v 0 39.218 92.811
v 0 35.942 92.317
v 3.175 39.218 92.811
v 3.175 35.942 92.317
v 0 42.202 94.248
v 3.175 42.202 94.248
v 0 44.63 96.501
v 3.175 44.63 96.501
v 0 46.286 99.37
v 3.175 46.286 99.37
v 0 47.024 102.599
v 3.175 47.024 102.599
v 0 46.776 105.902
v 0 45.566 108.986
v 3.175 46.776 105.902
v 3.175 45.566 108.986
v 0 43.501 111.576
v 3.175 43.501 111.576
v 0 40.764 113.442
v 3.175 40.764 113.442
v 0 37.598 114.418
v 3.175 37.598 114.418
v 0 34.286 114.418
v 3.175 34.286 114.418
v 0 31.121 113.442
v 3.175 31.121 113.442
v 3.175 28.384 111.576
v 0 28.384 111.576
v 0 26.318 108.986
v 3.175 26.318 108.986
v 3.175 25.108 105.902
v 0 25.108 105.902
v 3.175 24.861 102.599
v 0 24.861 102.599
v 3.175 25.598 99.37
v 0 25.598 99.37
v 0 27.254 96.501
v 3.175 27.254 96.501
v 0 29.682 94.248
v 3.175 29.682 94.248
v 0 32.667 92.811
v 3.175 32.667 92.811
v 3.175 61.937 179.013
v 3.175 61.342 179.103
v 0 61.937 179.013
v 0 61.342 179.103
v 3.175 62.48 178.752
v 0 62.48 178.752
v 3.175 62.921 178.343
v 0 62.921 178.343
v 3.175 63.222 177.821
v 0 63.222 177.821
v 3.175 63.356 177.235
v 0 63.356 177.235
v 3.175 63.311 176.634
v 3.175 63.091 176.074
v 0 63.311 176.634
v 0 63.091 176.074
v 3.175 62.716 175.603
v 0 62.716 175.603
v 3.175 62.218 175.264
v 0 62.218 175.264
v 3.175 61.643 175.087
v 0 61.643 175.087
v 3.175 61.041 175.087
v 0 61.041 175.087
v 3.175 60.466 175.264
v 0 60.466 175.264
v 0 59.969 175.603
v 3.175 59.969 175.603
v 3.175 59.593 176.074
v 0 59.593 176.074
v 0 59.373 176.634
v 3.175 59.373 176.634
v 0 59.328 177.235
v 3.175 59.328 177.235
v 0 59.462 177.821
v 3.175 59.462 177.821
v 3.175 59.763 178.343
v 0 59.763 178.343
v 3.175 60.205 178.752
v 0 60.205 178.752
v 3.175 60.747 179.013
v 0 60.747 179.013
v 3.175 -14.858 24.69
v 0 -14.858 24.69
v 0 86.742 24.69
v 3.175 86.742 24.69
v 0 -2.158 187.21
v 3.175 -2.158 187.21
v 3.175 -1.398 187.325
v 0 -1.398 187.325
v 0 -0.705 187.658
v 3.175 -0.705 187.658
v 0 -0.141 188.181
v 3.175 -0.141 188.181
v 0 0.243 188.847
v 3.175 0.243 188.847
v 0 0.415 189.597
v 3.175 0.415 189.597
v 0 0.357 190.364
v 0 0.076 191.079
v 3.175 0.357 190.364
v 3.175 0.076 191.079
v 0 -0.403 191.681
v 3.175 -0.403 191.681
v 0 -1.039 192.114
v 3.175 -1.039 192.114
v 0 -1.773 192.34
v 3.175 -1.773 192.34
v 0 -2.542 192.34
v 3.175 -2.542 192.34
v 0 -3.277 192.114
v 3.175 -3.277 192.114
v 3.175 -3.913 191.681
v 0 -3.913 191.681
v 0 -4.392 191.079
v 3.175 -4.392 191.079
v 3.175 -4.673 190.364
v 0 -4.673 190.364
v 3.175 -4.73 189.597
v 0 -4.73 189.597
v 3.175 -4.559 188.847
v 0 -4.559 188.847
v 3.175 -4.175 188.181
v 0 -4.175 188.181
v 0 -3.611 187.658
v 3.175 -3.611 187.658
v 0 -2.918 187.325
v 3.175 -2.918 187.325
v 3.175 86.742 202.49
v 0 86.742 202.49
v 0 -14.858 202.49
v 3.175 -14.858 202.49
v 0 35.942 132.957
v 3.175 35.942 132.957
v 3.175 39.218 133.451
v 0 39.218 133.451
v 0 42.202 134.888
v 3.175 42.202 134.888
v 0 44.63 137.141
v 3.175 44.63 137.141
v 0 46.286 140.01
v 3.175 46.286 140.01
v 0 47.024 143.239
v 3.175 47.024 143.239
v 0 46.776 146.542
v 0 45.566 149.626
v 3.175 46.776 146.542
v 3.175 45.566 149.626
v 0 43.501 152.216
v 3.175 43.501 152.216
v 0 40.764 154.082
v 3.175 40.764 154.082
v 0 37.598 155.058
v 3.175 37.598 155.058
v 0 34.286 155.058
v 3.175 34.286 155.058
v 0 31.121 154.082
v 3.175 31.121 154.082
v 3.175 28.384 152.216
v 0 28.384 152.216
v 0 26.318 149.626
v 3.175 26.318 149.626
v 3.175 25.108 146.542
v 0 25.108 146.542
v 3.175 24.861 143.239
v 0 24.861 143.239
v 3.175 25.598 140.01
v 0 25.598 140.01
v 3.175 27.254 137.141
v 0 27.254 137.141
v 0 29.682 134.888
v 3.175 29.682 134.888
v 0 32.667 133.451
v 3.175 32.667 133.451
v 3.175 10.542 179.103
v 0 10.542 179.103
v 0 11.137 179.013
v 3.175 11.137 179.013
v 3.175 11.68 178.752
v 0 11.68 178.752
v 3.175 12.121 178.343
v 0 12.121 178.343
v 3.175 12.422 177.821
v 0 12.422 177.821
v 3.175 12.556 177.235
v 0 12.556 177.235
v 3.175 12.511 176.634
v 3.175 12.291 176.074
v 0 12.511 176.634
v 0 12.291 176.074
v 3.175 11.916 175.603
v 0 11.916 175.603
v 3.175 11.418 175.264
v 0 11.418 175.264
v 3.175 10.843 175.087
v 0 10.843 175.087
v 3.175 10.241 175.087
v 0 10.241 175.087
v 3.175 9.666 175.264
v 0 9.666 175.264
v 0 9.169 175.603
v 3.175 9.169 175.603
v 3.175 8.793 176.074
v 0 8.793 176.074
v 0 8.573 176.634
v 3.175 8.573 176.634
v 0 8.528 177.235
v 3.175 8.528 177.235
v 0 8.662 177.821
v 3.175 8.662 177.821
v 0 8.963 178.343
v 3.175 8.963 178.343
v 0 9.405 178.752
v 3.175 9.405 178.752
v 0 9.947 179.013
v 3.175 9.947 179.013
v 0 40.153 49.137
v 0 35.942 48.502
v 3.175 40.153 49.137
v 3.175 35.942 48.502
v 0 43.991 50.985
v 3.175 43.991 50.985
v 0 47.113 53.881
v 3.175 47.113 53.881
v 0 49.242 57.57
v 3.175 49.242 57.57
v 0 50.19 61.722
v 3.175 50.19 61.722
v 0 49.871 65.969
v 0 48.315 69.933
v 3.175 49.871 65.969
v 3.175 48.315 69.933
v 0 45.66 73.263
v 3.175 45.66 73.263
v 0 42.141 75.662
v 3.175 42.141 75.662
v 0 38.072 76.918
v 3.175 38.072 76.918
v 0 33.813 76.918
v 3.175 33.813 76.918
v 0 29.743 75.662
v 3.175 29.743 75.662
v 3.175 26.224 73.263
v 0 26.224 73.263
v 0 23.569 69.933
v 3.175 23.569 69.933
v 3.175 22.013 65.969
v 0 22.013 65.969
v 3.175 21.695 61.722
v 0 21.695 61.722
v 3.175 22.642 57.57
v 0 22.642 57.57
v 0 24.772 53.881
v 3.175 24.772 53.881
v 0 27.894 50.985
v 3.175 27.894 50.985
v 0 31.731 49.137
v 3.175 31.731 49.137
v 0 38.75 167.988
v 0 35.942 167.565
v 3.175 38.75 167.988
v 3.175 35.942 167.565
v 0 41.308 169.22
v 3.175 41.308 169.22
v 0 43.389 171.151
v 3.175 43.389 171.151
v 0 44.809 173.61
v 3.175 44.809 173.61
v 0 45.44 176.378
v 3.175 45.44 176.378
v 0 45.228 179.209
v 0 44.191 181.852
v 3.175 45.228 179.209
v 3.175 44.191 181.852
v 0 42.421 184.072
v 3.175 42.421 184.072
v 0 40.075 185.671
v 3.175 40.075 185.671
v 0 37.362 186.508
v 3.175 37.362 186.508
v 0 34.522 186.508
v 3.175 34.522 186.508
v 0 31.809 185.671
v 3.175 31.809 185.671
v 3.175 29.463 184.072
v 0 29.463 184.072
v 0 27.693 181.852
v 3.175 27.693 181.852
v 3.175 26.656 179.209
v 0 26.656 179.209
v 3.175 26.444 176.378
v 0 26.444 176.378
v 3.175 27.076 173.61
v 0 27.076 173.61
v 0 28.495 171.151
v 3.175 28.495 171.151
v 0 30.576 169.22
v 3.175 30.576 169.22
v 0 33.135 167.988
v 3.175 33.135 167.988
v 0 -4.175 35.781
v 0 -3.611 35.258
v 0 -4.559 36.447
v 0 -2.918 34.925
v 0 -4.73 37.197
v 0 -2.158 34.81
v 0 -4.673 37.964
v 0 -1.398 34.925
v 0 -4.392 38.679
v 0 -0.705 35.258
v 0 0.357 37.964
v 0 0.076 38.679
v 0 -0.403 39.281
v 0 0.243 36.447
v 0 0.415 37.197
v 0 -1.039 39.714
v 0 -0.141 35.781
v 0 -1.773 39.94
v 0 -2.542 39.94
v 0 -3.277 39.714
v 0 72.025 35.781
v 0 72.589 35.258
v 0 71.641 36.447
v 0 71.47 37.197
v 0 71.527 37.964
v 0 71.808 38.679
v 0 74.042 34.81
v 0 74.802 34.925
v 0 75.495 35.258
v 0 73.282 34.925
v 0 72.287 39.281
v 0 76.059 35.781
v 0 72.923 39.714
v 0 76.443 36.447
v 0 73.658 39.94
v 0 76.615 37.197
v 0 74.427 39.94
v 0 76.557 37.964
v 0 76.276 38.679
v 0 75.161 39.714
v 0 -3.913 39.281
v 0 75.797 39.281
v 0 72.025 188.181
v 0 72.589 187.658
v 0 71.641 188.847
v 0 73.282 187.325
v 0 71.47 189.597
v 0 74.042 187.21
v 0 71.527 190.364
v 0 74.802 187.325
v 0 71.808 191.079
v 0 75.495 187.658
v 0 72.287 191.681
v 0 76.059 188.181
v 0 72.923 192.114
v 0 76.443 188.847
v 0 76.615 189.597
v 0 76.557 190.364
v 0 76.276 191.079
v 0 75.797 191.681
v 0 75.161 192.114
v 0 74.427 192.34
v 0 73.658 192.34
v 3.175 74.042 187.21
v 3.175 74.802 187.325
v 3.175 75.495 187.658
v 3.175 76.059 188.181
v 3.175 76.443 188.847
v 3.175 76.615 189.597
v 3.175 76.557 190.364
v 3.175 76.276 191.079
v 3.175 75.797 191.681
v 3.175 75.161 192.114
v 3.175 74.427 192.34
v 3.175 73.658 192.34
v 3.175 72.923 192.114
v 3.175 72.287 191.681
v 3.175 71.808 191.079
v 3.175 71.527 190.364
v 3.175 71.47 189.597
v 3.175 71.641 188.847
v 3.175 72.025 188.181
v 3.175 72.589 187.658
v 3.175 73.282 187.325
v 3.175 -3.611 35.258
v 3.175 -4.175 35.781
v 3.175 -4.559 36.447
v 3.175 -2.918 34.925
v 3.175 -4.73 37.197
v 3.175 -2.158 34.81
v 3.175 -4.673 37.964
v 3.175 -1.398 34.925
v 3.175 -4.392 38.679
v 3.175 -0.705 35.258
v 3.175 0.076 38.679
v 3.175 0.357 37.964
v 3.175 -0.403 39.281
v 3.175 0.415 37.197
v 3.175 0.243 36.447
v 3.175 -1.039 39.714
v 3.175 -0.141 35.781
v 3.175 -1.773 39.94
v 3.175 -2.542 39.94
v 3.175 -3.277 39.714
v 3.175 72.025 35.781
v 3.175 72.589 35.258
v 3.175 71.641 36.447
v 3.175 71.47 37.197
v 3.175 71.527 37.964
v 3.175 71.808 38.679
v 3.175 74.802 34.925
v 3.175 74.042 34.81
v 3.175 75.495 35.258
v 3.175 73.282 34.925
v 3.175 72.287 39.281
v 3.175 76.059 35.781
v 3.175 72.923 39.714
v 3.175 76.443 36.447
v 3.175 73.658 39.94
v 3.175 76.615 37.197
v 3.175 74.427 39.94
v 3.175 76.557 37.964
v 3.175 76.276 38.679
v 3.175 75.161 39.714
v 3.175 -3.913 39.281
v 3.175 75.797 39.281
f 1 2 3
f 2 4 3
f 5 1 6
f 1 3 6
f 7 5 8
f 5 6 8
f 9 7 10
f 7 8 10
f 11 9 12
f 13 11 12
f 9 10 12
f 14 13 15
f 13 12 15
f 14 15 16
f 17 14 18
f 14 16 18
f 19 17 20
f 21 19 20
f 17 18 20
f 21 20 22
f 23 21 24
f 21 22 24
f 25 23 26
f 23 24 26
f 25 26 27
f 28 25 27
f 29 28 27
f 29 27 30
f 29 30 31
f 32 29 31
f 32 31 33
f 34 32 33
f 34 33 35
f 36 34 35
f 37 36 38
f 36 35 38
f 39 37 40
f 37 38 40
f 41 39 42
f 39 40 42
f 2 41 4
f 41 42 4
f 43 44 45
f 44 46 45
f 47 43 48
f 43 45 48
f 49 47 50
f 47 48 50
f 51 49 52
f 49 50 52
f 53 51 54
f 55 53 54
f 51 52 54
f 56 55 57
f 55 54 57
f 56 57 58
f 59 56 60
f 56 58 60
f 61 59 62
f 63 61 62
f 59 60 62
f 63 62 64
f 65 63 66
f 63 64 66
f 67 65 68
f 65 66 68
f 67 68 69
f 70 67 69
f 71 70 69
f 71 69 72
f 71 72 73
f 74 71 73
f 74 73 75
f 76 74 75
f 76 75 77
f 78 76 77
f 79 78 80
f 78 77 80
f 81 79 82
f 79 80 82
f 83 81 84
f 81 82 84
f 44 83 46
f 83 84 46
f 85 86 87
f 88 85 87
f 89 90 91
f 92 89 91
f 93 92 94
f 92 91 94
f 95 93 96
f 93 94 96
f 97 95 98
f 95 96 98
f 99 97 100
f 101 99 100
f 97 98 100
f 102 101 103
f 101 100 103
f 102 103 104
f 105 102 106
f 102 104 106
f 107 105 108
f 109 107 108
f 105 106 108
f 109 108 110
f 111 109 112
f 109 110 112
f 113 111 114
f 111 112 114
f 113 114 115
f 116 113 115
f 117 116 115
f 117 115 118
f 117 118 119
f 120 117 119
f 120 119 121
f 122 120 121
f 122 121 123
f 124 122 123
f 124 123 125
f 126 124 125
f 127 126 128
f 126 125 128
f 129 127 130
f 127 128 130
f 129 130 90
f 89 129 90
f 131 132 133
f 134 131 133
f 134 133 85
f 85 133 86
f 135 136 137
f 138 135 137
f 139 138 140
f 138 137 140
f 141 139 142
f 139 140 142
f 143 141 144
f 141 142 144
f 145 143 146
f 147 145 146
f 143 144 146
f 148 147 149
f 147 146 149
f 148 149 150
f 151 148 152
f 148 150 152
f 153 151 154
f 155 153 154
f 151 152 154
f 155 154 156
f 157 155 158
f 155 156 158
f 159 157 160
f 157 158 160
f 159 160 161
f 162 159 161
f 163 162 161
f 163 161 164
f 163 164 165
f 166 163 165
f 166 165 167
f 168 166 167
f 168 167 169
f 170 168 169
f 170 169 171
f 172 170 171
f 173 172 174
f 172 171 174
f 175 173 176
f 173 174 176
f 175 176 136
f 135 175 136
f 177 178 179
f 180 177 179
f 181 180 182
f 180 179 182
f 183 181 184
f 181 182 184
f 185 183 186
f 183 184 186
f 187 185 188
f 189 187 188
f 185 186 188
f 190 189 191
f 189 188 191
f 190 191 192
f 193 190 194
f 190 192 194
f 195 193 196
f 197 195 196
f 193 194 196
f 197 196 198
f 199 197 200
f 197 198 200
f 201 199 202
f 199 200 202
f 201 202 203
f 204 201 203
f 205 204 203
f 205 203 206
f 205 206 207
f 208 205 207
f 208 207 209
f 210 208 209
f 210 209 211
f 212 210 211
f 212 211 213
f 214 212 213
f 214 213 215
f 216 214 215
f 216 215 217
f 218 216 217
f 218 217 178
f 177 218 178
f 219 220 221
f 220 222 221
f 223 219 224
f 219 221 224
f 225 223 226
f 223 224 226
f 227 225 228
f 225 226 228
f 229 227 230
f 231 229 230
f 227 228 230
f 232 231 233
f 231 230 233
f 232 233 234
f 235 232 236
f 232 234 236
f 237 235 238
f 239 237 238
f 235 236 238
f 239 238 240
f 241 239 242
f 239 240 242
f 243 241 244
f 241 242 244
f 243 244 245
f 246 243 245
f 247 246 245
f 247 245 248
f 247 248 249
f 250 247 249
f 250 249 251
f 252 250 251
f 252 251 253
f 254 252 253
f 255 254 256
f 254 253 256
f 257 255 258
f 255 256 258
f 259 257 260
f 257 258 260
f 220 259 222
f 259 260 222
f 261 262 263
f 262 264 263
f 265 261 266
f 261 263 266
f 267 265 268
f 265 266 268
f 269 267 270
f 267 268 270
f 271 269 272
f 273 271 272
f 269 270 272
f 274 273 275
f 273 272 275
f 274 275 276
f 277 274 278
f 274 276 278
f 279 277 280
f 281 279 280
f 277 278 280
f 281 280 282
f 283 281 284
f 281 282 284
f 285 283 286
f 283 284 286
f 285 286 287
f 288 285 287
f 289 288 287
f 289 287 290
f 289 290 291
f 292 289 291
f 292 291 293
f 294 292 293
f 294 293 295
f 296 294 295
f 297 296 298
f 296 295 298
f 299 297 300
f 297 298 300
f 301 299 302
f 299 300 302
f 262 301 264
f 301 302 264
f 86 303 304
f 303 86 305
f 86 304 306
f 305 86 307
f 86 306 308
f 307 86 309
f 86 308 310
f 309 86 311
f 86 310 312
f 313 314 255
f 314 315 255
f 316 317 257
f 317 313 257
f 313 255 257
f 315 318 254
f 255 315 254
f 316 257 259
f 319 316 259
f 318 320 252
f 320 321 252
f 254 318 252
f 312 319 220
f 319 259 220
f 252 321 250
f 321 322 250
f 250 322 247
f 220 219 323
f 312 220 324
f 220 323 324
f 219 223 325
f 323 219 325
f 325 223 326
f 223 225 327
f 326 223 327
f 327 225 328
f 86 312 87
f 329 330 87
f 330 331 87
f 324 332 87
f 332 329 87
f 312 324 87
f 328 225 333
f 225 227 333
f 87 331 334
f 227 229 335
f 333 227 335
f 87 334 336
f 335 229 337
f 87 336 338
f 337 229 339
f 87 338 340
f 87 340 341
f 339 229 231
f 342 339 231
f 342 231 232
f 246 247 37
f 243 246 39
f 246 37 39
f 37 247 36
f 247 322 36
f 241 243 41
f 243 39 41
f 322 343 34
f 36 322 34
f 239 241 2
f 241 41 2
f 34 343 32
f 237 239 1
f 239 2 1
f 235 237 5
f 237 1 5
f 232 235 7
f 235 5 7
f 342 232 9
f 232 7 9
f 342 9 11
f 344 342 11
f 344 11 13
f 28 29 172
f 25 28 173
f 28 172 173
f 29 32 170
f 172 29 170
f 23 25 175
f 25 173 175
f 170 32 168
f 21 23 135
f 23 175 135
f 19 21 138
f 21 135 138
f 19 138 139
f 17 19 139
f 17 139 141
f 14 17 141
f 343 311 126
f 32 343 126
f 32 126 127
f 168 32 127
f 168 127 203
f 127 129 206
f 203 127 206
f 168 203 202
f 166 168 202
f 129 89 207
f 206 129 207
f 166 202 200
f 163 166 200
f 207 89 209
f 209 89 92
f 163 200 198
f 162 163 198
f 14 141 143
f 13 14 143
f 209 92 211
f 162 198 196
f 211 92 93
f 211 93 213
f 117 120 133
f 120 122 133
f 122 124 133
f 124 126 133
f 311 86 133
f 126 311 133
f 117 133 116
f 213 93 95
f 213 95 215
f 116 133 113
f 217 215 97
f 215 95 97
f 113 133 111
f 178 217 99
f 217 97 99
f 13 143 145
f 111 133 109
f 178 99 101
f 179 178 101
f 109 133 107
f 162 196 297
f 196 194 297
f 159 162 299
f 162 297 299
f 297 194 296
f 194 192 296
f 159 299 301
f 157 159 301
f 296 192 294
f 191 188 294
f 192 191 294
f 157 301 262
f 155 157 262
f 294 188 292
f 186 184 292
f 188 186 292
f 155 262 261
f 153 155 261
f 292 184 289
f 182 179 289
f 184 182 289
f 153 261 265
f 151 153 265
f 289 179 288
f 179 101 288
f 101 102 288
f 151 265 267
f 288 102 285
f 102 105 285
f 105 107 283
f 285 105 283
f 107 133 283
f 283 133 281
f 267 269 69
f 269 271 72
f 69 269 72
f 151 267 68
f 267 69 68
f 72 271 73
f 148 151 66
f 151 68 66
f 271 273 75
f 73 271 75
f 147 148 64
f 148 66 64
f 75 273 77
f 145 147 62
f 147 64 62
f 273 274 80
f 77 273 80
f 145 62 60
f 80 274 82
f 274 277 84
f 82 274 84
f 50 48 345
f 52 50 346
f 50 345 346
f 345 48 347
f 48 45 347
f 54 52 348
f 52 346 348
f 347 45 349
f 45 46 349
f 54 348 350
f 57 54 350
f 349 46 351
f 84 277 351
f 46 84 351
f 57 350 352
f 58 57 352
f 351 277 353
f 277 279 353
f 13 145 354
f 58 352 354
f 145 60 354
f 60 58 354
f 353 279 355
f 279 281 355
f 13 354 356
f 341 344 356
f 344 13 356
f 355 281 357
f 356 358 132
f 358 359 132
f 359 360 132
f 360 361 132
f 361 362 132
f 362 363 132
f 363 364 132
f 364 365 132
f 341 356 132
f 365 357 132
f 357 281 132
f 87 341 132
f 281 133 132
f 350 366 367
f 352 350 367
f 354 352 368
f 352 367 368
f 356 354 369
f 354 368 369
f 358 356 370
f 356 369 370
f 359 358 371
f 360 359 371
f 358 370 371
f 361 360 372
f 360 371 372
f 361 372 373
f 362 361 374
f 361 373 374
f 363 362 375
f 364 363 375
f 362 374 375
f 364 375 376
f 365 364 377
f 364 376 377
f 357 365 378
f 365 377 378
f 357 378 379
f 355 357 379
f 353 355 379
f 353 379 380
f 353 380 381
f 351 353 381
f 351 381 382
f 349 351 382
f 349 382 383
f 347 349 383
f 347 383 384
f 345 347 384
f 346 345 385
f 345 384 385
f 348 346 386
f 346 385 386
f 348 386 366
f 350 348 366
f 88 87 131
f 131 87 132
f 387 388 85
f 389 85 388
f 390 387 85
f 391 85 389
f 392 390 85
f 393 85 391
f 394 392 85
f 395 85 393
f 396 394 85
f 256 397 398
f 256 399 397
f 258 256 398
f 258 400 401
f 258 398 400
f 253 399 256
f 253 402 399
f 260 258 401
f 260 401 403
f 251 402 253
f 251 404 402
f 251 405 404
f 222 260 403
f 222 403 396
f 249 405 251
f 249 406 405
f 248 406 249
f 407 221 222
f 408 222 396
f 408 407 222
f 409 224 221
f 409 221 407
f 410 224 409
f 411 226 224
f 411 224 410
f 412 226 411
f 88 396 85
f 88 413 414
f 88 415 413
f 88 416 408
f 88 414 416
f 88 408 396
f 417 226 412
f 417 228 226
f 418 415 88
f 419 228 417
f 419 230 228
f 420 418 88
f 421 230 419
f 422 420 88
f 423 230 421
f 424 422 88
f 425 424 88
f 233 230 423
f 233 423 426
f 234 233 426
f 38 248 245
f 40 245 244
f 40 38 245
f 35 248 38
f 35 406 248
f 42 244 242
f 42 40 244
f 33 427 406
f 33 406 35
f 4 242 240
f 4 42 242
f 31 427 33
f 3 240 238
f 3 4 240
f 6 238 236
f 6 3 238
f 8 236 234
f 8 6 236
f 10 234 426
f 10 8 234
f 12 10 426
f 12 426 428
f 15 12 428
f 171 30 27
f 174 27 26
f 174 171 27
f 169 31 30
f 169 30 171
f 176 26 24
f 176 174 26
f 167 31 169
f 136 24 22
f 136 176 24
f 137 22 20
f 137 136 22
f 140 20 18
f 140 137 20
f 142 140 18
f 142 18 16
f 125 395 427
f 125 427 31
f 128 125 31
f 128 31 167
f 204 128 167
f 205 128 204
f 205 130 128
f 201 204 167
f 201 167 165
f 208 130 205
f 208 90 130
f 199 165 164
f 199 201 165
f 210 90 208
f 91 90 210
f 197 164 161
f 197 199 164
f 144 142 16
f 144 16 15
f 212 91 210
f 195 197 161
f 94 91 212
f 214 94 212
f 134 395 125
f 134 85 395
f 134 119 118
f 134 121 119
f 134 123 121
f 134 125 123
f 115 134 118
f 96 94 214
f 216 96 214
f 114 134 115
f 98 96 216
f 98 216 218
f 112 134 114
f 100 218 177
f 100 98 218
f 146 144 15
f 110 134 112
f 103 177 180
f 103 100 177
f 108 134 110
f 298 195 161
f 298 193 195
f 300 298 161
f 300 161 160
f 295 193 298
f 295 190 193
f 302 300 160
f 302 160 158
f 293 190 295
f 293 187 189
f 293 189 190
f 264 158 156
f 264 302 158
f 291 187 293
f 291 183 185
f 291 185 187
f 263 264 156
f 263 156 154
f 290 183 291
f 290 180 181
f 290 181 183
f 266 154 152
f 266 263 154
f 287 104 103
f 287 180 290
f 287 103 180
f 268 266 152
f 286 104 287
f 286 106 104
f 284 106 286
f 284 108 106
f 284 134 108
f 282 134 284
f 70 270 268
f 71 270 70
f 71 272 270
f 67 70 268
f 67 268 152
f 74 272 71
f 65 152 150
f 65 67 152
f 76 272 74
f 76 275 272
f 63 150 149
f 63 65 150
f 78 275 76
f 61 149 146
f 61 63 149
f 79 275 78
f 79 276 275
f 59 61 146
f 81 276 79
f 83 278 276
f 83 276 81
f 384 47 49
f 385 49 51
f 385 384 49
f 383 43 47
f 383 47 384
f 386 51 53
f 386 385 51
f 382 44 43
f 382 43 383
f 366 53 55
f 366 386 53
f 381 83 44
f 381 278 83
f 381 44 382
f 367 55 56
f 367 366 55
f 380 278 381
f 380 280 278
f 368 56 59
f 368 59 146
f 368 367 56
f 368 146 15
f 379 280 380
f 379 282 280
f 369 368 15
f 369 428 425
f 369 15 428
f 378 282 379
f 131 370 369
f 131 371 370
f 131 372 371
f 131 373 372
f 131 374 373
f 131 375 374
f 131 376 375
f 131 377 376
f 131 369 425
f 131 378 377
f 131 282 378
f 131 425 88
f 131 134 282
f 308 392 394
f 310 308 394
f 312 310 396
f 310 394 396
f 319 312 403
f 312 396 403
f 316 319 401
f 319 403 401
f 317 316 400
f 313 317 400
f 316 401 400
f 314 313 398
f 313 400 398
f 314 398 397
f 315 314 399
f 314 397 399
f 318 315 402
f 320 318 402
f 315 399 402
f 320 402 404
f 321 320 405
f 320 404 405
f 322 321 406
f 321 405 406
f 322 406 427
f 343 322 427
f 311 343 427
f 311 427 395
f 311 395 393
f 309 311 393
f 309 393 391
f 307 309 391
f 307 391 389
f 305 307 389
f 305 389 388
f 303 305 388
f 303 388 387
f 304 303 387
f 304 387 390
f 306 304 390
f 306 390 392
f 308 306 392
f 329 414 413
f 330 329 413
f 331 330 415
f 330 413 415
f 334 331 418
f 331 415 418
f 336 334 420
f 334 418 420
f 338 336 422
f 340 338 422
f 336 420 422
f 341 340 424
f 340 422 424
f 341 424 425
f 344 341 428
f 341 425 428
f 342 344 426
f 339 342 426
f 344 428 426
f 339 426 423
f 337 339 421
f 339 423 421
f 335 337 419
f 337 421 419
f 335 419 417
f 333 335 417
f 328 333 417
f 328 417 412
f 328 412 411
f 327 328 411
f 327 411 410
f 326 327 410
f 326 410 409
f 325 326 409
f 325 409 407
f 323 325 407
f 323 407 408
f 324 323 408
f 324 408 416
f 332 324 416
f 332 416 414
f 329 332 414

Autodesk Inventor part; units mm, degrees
ref_plane "YZ Plane" through (0, 0, 0) normal (1, 0, 0) x (0, 1, 0)
ref_plane "XZ Plane" through (0, 0, 0) normal (0, 1, 0) x (-1, 0, 0)
ref_plane "XY Plane" through (0, 0, 0) normal (0, 0, 1) x (1, 0, 0)
sketch "Sketch1" plane through (0, 0, 0) normal (1, 0, 0) x (0, 1, 0)
  line L0 (86.7421, 202.4896) -> (-14.8579, 202.4896)
  line L1 (-14.8579, 202.4896) -> (-14.8579, 24.6896)
  line L2 (-14.8579, 24.6896) -> (86.7421, 24.6896)
  line L3 (86.7421, 24.6896) -> (86.7421, 202.4896)
  line L4 (86.7421, 202.4896) -> (86.7421, 227.8896) construction
  point P0 (0, 0)
  dimension "d0" = 101.6
  dimension "d1" = 177.8
  dimension "d23" = 25.4
extrude "Extrusion1" add sketch "Sketch1" along normal blind 3.175
sketch "Sketch2" plane through (3.175, 0, 0) normal (1, 0, 0) x (0, 0, -1)
  line L0 (-202.4896, 86.7421) -> (-202.4896, -14.8579) construction
  line L1 (-202.4896, 35.9421) -> (-177.0896, 35.9421) construction
  line L2 (-177.0896, 35.9421) -> (-144.0696, 35.9421) construction
  circle A0 centre (-144.0696, 35.9421) radius 11.1125
  line L3 (-144.0696, 35.9421) -> (-103.4296, 35.9421) construction
  line L4 (-103.4296, 35.9421) -> (-62.7896, 35.9421) construction
  circle A1 centre (-103.4296, 35.9421) radius 11.1125
  circle A2 centre (-62.7896, 35.9421) radius 14.2875
  circle A3 centre (-177.0896, 35.9421) radius 9.525
  point P0 (0, 0)
  dimension "d4" = 25.4
  dimension "d5" = 33.02
  dimension "d7" = 22.225
  dimension "d8" = 40.64
  dimension "d9" = 40.64
  dimension "d10" = 22.225
  dimension "d11" = 28.575
  dimension "d14" = 19.05
extrude "Extrusion2" cut sketch "Sketch2" against normal blind 12.7
sketch "Sketch3" plane through (0, 0, 0) normal (-1, 0, 0) x (0, 0, 1)
  circle A0 centre (177.0896, 35.9421) radius 9.525 projected
  circle A1 centre (177.0836, 61.3421) radius 2.0193
  circle A2 centre (177.0836, 10.5421) radius 2.0193
  line L0 (177.0836, 61.3421) -> (177.0836, 10.5421) construction
  point P0 (0, 0)
  dimension "d17" = 4.0386
  dimension "d18" = 4.0386
extrude "Extrusion3" cut sketch "Sketch3" against normal blind 25.4 contours A1 | A2
sketch "Sketch4" plane through (3.175, 0, 0) normal (1, 0, 0) x (0, 0, -1)
  line L0 (-24.6896, 86.7421) -> (-202.4896, 86.7421) construction
  line L1 (-202.4896, 86.7421) -> (-189.7896, 86.7421) construction
  line L2 (-189.7896, 86.7421) -> (-189.7896, 74.0421) construction
  line L3 (-189.7896, 74.0421) -> (-202.4896, 74.0421) construction
  line L4 (-202.4896, 74.0421) -> (-202.4896, 86.7421) construction
  line L5 (-202.4896, 86.7421) -> (-202.4896, -14.8579) construction
  line L6 (-202.4896, -14.8579) -> (-189.7896, -14.8579) construction
  line L7 (-189.7896, -14.8579) -> (-189.7896, -2.1579) construction
  line L8 (-189.7896, -2.1579) -> (-202.4896, -2.1579) construction
  line L9 (-202.4896, -2.1579) -> (-202.4896, -14.8579) construction
  line L10 (-202.4896, -14.8579) -> (-24.6896, -14.8579) construction
  line L11 (-24.6896, -14.8579) -> (-37.3896, -14.8579) construction
  line L12 (-37.3896, -14.8579) -> (-37.3896, -2.1579) construction
  line L13 (-37.3896, -2.1579) -> (-24.6896, -2.1579) construction
  line L14 (-24.6896, -2.1579) -> (-24.6896, -14.8579) construction
  line L15 (-24.6896, 86.7421) -> (-37.3896, 86.7421) construction
  line L16 (-37.3896, 86.7421) -> (-37.3896, 74.0421) construction
  line L17 (-37.3896, 74.0421) -> (-24.6896, 74.0421) construction
  line L18 (-24.6896, 74.0421) -> (-24.6896, 86.7421) construction
  circle A0 centre (-189.7896, 74.0421) radius 2.5797
  circle A1 centre (-37.3896, 74.0421) radius 2.5797
  circle A2 centre (-37.3896, -2.1579) radius 2.5797
  circle A3 centre (-189.7896, -2.1579) radius 2.5797
  point P0 (0, 0)
  dimension "d24" = 12.7
  dimension "d25" = 12.7
  dimension "d26" = 12.7
  dimension "d27" = 12.7
  dimension "d28" = 12.7
  dimension "d29" = 12.7
  dimension "d30" = 12.7
  dimension "d31" = 12.7
  dimension "d32" = 5.1594
  dimension "d33" = 5.1594
  dimension "d34" = 5.1594
  dimension "d35" = 5.1594
extrude "Extrusion4" cut sketch "Sketch4" against normal blind 25.4
properties part number "ARm Gearbox Plate"
